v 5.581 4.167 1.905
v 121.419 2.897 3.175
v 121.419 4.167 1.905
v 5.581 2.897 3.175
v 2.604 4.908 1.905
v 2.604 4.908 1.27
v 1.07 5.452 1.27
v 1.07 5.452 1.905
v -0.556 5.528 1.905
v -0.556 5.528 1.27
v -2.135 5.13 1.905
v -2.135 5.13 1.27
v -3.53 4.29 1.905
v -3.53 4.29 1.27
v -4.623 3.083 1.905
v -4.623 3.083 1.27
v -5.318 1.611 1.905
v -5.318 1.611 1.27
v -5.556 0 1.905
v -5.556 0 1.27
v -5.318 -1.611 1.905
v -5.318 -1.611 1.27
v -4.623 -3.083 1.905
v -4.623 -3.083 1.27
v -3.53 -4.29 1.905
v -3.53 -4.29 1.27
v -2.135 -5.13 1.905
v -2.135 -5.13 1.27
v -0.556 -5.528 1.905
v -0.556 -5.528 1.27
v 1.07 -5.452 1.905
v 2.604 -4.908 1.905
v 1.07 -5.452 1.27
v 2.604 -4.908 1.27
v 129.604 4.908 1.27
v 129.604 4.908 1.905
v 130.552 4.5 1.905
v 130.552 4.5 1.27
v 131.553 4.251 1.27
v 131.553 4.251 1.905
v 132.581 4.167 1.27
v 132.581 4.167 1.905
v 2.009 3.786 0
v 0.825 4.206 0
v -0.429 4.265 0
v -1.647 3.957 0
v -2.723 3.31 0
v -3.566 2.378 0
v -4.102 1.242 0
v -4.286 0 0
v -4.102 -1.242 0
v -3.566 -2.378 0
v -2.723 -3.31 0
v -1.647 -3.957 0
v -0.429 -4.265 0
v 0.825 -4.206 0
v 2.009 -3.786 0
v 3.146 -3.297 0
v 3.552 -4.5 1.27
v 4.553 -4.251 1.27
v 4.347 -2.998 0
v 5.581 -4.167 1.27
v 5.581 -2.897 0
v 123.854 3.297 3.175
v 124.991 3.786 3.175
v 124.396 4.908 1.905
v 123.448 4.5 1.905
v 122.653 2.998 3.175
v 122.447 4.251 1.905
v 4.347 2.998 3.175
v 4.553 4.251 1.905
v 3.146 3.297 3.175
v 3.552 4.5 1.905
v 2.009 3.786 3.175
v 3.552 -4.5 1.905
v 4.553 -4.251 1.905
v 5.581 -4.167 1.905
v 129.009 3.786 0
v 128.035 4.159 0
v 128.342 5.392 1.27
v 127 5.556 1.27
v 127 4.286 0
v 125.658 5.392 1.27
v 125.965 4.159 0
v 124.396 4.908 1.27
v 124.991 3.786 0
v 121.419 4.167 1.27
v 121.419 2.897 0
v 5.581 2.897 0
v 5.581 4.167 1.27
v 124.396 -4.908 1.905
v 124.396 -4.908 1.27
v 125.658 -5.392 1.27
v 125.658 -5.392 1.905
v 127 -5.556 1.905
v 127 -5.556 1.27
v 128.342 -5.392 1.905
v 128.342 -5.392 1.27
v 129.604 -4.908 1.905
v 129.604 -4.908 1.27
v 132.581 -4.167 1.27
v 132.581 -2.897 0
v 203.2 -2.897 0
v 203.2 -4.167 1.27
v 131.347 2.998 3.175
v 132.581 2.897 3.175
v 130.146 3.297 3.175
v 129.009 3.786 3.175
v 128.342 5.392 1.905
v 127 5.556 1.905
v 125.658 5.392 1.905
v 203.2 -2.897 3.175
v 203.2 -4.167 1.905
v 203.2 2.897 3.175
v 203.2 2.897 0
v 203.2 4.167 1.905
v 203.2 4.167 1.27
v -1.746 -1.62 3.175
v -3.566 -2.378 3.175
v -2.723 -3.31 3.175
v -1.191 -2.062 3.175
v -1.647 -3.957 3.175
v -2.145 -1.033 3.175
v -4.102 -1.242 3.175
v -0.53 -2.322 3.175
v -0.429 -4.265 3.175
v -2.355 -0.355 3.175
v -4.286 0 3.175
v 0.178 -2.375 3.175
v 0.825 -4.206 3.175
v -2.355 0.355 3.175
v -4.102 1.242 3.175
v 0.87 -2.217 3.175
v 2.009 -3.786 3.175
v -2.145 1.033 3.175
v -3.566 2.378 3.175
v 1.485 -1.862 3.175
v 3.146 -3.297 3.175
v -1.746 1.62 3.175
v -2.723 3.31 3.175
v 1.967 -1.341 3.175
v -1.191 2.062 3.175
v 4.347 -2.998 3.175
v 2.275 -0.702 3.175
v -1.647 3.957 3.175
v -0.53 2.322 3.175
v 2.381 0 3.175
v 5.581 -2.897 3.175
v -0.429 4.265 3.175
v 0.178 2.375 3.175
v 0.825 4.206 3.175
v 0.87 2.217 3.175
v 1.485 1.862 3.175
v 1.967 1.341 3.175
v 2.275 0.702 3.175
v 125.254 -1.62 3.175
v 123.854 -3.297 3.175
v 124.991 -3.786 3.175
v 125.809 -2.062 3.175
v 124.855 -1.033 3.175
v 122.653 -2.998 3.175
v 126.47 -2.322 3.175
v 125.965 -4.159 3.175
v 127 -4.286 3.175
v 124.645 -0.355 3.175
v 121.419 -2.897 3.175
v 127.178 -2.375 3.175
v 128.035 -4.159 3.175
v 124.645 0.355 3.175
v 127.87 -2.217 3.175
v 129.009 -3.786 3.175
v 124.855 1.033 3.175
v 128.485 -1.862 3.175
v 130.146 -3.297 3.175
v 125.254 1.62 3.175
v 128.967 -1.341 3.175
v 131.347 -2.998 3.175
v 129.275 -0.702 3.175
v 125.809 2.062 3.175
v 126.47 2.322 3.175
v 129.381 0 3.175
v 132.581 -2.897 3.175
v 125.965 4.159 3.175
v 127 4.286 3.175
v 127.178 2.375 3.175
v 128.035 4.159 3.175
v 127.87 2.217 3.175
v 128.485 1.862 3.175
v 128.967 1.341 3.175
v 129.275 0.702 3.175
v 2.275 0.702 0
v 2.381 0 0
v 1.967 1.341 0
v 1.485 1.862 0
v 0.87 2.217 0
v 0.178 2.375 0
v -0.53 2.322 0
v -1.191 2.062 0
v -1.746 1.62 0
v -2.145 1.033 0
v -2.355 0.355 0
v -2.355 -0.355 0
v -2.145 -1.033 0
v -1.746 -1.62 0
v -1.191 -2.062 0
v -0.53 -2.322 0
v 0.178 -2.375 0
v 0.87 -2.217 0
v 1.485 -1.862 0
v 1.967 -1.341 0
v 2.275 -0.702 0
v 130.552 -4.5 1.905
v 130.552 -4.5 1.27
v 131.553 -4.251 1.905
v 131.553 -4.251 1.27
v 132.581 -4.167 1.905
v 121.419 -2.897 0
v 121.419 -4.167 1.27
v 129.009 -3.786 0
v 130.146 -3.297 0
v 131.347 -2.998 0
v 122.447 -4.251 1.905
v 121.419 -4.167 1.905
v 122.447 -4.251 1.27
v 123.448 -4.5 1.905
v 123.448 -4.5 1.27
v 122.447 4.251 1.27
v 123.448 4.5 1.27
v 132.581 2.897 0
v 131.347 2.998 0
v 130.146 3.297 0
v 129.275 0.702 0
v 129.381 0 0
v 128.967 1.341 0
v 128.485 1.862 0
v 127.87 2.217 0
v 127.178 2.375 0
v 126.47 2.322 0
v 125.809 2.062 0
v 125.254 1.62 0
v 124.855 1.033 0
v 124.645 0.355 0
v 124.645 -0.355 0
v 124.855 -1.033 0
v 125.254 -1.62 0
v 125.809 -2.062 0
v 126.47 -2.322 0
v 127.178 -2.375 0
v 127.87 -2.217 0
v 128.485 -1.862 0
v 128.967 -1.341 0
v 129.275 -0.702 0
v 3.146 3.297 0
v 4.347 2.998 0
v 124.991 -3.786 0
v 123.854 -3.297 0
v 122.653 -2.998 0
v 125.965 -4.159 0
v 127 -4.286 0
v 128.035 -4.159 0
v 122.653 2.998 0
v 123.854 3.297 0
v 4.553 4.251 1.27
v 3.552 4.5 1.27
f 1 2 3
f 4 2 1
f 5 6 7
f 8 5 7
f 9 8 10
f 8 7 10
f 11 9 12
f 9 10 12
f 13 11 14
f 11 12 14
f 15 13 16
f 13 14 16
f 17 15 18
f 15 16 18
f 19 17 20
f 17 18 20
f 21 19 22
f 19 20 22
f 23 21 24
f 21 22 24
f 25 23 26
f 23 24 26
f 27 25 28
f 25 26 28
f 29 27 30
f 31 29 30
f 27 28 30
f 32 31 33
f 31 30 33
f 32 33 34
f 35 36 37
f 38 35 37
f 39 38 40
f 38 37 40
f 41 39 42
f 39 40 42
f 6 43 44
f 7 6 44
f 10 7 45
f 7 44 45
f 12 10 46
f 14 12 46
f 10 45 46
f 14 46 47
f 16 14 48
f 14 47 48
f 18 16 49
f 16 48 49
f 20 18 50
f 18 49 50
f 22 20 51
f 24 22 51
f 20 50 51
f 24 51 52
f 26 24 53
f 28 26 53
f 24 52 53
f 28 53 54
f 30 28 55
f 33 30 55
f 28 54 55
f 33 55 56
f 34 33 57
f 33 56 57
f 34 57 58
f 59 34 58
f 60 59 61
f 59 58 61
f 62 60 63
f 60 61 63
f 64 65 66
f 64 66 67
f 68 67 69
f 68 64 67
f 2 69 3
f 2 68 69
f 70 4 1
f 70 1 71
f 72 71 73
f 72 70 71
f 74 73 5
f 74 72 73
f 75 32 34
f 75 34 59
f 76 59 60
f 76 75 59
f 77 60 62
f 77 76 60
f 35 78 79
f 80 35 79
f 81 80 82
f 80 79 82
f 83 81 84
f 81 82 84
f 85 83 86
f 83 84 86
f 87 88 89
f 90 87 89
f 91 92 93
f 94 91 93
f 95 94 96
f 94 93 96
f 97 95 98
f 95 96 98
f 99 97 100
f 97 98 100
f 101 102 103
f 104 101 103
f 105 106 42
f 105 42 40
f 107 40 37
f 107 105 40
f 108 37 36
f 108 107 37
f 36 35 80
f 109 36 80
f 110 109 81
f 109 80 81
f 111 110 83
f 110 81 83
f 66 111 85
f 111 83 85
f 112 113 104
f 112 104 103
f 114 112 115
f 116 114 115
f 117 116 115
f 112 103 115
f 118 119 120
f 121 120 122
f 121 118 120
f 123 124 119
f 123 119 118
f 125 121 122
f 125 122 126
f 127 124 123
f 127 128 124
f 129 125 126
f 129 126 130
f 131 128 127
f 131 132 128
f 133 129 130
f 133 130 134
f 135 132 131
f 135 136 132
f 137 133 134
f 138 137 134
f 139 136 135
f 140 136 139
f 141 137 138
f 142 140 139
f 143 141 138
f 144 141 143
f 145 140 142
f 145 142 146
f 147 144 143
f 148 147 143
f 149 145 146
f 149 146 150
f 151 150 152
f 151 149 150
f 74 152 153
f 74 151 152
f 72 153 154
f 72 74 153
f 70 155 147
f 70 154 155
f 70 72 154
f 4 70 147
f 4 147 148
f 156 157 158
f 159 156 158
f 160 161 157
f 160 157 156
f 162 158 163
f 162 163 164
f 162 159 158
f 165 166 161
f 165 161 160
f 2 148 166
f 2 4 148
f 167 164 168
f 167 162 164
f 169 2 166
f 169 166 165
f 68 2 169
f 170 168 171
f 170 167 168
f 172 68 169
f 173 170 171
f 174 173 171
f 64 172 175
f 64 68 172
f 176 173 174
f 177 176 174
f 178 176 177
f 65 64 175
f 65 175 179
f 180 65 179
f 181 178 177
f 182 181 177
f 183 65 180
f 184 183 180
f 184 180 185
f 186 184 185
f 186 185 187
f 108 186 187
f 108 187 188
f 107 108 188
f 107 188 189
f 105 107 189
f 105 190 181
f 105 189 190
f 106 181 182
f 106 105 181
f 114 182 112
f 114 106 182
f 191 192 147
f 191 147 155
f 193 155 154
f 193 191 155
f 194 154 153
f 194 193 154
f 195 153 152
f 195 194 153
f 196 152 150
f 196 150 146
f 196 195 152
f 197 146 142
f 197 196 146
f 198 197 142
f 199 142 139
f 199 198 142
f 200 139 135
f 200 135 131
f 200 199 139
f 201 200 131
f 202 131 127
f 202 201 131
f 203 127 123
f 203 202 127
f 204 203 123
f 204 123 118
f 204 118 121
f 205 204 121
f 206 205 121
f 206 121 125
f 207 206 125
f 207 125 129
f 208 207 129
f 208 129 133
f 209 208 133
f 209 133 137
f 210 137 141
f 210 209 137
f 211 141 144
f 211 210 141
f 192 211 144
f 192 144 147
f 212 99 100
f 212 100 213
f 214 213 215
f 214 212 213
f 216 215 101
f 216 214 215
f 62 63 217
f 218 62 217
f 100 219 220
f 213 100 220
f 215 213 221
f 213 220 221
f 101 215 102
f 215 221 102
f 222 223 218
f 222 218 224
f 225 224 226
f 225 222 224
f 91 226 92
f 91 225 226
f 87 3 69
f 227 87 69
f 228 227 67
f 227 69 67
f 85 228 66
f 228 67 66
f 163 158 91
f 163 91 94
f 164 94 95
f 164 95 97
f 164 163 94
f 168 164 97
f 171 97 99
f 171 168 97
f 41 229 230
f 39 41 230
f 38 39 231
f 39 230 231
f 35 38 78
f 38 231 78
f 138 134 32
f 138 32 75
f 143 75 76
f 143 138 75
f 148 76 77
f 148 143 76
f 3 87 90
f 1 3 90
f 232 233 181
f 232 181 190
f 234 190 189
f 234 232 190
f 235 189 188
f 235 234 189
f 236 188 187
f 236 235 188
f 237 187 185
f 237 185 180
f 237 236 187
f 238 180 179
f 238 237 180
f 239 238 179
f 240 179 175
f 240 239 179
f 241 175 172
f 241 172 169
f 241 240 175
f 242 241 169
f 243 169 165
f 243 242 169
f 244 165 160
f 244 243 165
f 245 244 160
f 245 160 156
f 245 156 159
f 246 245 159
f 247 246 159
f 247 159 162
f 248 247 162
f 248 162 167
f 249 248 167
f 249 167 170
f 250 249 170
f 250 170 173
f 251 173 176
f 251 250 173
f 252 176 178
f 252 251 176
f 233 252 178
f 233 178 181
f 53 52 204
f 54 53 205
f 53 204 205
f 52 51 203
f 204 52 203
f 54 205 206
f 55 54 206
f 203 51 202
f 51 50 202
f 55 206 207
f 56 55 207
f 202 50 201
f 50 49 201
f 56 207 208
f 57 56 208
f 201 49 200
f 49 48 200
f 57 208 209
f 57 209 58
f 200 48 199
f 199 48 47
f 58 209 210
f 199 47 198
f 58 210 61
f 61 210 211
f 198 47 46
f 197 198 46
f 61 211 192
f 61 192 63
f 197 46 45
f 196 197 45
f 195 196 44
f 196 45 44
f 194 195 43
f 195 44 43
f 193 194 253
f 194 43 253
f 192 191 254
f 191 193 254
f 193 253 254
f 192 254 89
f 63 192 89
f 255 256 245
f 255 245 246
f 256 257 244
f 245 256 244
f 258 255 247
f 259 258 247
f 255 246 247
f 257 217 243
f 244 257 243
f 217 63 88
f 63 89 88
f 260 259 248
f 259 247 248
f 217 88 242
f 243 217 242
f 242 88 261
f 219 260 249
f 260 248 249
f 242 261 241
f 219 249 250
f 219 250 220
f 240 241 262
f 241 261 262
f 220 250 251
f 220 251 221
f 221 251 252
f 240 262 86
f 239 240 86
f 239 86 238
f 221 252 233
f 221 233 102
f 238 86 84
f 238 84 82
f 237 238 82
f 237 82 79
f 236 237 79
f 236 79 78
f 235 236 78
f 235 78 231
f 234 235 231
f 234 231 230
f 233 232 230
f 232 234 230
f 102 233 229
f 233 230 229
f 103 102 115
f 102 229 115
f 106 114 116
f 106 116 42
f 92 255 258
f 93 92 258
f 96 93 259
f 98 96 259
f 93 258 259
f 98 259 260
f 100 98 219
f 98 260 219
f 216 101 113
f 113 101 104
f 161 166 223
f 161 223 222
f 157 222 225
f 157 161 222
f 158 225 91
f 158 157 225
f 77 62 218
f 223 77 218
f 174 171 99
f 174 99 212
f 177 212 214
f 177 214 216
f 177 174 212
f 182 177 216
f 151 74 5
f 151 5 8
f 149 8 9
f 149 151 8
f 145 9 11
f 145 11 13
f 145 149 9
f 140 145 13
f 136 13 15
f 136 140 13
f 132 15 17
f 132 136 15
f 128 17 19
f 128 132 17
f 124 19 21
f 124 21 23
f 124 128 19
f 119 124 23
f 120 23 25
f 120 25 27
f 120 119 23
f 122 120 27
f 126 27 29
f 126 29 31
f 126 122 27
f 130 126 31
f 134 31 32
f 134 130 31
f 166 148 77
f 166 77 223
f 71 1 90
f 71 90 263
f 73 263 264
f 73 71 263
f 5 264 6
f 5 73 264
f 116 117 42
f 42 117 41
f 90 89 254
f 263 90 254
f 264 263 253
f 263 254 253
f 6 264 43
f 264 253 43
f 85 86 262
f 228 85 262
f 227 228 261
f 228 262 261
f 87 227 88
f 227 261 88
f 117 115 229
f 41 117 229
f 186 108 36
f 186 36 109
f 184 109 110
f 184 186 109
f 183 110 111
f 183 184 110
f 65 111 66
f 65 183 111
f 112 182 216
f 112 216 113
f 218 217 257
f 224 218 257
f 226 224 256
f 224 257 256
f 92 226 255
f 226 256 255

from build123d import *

# Parameters (mm, degrees)
F0_R     = 2.38125
F1_DEPTH = 3.175
F2_R     = 6.35
F3_SIZE  = 1.27


with BuildPart() as f1:
    # F0 (on Top) → F1 (new body)
    with BuildSketch(Plane.XY):
        with BuildLine():
            Line((123.3248860695, 4.1671875), (3.6751139305, 4.1671875))
            ThreePointArc((3.6751139305, 4.1671875), (-5.55625, 0), (3.6751139305, -4.1671875))
            Line((3.6751139305, -4.1671875), (123.3248860695, -4.1671875))
            ThreePointArc((123.3248860695, -4.1671875), (127, -5.55625), (130.6751139305, -4.1671875))
            Line((130.6751139305, -4.1671875), (203.2, -4.1671875))
            Line((203.2, -4.1671875), (203.2, 4.1671875))
            Line((203.2, 4.1671875), (130.6751139305, 4.1671875))
            ThreePointArc((130.6751139305, 4.1671875), (127, 5.55625), (123.3248860695, 4.1671875))
        make_face()
        Circle(F0_R, mode=Mode.SUBTRACT)
        with Locations((127, 0)):
            Circle(F0_R, mode=Mode.SUBTRACT)
    extrude(amount=F1_DEPTH)

    # F2
    f2_edges = [f1.edges().sort_by_distance(p)[0] for p in [
        (3.675114, 4.167187, 1.5875),
        (3.675114, -4.167188, 1.5875),
        (123.324886, -4.167187, 1.5875),
        (130.675114, 4.167187, 1.5875),
        (123.324886, 4.167187, 1.5875),
        (130.675114, -4.167187, 1.5875),
    ]]
    fillet(f2_edges, radius=F2_R)

    # F3
    f3_edges = [f1.edges().sort_by_distance(p)[0] for p in [
        (63.5, 4.167187, 3.175),
        (63.5, 4.167187, 0),
        (127, 5.55625, 0),
        (127, 5.55625, 3.175),
        (131.047329, 4.355179, 0),
        (122.952671, 4.355179, 0),
        (167.8905, 4.167187, 0),
        (4.047329, 4.355179, 0),
        (167.8905, -4.167187, 0),
        (-5.55625, 0, 0),
        (131.047329, -4.355179, 0),
        (4.047329, -4.355179, 0),
        (127, -5.55625, 0),
        (63.5, -4.167187, 0),
        (122.952671, -4.355179, 0),
        (131.047329, 4.355179, 3.175),
        (122.952671, 4.355179, 3.175),
        (167.8905, 4.167187, 3.175),
        (4.047329, 4.355179, 3.175),
        (167.8905, -4.167187, 3.175),
        (-5.55625, 0, 3.175),
        (131.047329, -4.355179, 3.175),
        (4.047329, -4.355179, 3.175),
        (127, -5.55625, 3.175),
        (63.5, -4.167187, 3.175),
        (122.952671, -4.355179, 3.175),
    ]]
    chamfer(f3_edges, length=F3_SIZE)


solid = f1.part
